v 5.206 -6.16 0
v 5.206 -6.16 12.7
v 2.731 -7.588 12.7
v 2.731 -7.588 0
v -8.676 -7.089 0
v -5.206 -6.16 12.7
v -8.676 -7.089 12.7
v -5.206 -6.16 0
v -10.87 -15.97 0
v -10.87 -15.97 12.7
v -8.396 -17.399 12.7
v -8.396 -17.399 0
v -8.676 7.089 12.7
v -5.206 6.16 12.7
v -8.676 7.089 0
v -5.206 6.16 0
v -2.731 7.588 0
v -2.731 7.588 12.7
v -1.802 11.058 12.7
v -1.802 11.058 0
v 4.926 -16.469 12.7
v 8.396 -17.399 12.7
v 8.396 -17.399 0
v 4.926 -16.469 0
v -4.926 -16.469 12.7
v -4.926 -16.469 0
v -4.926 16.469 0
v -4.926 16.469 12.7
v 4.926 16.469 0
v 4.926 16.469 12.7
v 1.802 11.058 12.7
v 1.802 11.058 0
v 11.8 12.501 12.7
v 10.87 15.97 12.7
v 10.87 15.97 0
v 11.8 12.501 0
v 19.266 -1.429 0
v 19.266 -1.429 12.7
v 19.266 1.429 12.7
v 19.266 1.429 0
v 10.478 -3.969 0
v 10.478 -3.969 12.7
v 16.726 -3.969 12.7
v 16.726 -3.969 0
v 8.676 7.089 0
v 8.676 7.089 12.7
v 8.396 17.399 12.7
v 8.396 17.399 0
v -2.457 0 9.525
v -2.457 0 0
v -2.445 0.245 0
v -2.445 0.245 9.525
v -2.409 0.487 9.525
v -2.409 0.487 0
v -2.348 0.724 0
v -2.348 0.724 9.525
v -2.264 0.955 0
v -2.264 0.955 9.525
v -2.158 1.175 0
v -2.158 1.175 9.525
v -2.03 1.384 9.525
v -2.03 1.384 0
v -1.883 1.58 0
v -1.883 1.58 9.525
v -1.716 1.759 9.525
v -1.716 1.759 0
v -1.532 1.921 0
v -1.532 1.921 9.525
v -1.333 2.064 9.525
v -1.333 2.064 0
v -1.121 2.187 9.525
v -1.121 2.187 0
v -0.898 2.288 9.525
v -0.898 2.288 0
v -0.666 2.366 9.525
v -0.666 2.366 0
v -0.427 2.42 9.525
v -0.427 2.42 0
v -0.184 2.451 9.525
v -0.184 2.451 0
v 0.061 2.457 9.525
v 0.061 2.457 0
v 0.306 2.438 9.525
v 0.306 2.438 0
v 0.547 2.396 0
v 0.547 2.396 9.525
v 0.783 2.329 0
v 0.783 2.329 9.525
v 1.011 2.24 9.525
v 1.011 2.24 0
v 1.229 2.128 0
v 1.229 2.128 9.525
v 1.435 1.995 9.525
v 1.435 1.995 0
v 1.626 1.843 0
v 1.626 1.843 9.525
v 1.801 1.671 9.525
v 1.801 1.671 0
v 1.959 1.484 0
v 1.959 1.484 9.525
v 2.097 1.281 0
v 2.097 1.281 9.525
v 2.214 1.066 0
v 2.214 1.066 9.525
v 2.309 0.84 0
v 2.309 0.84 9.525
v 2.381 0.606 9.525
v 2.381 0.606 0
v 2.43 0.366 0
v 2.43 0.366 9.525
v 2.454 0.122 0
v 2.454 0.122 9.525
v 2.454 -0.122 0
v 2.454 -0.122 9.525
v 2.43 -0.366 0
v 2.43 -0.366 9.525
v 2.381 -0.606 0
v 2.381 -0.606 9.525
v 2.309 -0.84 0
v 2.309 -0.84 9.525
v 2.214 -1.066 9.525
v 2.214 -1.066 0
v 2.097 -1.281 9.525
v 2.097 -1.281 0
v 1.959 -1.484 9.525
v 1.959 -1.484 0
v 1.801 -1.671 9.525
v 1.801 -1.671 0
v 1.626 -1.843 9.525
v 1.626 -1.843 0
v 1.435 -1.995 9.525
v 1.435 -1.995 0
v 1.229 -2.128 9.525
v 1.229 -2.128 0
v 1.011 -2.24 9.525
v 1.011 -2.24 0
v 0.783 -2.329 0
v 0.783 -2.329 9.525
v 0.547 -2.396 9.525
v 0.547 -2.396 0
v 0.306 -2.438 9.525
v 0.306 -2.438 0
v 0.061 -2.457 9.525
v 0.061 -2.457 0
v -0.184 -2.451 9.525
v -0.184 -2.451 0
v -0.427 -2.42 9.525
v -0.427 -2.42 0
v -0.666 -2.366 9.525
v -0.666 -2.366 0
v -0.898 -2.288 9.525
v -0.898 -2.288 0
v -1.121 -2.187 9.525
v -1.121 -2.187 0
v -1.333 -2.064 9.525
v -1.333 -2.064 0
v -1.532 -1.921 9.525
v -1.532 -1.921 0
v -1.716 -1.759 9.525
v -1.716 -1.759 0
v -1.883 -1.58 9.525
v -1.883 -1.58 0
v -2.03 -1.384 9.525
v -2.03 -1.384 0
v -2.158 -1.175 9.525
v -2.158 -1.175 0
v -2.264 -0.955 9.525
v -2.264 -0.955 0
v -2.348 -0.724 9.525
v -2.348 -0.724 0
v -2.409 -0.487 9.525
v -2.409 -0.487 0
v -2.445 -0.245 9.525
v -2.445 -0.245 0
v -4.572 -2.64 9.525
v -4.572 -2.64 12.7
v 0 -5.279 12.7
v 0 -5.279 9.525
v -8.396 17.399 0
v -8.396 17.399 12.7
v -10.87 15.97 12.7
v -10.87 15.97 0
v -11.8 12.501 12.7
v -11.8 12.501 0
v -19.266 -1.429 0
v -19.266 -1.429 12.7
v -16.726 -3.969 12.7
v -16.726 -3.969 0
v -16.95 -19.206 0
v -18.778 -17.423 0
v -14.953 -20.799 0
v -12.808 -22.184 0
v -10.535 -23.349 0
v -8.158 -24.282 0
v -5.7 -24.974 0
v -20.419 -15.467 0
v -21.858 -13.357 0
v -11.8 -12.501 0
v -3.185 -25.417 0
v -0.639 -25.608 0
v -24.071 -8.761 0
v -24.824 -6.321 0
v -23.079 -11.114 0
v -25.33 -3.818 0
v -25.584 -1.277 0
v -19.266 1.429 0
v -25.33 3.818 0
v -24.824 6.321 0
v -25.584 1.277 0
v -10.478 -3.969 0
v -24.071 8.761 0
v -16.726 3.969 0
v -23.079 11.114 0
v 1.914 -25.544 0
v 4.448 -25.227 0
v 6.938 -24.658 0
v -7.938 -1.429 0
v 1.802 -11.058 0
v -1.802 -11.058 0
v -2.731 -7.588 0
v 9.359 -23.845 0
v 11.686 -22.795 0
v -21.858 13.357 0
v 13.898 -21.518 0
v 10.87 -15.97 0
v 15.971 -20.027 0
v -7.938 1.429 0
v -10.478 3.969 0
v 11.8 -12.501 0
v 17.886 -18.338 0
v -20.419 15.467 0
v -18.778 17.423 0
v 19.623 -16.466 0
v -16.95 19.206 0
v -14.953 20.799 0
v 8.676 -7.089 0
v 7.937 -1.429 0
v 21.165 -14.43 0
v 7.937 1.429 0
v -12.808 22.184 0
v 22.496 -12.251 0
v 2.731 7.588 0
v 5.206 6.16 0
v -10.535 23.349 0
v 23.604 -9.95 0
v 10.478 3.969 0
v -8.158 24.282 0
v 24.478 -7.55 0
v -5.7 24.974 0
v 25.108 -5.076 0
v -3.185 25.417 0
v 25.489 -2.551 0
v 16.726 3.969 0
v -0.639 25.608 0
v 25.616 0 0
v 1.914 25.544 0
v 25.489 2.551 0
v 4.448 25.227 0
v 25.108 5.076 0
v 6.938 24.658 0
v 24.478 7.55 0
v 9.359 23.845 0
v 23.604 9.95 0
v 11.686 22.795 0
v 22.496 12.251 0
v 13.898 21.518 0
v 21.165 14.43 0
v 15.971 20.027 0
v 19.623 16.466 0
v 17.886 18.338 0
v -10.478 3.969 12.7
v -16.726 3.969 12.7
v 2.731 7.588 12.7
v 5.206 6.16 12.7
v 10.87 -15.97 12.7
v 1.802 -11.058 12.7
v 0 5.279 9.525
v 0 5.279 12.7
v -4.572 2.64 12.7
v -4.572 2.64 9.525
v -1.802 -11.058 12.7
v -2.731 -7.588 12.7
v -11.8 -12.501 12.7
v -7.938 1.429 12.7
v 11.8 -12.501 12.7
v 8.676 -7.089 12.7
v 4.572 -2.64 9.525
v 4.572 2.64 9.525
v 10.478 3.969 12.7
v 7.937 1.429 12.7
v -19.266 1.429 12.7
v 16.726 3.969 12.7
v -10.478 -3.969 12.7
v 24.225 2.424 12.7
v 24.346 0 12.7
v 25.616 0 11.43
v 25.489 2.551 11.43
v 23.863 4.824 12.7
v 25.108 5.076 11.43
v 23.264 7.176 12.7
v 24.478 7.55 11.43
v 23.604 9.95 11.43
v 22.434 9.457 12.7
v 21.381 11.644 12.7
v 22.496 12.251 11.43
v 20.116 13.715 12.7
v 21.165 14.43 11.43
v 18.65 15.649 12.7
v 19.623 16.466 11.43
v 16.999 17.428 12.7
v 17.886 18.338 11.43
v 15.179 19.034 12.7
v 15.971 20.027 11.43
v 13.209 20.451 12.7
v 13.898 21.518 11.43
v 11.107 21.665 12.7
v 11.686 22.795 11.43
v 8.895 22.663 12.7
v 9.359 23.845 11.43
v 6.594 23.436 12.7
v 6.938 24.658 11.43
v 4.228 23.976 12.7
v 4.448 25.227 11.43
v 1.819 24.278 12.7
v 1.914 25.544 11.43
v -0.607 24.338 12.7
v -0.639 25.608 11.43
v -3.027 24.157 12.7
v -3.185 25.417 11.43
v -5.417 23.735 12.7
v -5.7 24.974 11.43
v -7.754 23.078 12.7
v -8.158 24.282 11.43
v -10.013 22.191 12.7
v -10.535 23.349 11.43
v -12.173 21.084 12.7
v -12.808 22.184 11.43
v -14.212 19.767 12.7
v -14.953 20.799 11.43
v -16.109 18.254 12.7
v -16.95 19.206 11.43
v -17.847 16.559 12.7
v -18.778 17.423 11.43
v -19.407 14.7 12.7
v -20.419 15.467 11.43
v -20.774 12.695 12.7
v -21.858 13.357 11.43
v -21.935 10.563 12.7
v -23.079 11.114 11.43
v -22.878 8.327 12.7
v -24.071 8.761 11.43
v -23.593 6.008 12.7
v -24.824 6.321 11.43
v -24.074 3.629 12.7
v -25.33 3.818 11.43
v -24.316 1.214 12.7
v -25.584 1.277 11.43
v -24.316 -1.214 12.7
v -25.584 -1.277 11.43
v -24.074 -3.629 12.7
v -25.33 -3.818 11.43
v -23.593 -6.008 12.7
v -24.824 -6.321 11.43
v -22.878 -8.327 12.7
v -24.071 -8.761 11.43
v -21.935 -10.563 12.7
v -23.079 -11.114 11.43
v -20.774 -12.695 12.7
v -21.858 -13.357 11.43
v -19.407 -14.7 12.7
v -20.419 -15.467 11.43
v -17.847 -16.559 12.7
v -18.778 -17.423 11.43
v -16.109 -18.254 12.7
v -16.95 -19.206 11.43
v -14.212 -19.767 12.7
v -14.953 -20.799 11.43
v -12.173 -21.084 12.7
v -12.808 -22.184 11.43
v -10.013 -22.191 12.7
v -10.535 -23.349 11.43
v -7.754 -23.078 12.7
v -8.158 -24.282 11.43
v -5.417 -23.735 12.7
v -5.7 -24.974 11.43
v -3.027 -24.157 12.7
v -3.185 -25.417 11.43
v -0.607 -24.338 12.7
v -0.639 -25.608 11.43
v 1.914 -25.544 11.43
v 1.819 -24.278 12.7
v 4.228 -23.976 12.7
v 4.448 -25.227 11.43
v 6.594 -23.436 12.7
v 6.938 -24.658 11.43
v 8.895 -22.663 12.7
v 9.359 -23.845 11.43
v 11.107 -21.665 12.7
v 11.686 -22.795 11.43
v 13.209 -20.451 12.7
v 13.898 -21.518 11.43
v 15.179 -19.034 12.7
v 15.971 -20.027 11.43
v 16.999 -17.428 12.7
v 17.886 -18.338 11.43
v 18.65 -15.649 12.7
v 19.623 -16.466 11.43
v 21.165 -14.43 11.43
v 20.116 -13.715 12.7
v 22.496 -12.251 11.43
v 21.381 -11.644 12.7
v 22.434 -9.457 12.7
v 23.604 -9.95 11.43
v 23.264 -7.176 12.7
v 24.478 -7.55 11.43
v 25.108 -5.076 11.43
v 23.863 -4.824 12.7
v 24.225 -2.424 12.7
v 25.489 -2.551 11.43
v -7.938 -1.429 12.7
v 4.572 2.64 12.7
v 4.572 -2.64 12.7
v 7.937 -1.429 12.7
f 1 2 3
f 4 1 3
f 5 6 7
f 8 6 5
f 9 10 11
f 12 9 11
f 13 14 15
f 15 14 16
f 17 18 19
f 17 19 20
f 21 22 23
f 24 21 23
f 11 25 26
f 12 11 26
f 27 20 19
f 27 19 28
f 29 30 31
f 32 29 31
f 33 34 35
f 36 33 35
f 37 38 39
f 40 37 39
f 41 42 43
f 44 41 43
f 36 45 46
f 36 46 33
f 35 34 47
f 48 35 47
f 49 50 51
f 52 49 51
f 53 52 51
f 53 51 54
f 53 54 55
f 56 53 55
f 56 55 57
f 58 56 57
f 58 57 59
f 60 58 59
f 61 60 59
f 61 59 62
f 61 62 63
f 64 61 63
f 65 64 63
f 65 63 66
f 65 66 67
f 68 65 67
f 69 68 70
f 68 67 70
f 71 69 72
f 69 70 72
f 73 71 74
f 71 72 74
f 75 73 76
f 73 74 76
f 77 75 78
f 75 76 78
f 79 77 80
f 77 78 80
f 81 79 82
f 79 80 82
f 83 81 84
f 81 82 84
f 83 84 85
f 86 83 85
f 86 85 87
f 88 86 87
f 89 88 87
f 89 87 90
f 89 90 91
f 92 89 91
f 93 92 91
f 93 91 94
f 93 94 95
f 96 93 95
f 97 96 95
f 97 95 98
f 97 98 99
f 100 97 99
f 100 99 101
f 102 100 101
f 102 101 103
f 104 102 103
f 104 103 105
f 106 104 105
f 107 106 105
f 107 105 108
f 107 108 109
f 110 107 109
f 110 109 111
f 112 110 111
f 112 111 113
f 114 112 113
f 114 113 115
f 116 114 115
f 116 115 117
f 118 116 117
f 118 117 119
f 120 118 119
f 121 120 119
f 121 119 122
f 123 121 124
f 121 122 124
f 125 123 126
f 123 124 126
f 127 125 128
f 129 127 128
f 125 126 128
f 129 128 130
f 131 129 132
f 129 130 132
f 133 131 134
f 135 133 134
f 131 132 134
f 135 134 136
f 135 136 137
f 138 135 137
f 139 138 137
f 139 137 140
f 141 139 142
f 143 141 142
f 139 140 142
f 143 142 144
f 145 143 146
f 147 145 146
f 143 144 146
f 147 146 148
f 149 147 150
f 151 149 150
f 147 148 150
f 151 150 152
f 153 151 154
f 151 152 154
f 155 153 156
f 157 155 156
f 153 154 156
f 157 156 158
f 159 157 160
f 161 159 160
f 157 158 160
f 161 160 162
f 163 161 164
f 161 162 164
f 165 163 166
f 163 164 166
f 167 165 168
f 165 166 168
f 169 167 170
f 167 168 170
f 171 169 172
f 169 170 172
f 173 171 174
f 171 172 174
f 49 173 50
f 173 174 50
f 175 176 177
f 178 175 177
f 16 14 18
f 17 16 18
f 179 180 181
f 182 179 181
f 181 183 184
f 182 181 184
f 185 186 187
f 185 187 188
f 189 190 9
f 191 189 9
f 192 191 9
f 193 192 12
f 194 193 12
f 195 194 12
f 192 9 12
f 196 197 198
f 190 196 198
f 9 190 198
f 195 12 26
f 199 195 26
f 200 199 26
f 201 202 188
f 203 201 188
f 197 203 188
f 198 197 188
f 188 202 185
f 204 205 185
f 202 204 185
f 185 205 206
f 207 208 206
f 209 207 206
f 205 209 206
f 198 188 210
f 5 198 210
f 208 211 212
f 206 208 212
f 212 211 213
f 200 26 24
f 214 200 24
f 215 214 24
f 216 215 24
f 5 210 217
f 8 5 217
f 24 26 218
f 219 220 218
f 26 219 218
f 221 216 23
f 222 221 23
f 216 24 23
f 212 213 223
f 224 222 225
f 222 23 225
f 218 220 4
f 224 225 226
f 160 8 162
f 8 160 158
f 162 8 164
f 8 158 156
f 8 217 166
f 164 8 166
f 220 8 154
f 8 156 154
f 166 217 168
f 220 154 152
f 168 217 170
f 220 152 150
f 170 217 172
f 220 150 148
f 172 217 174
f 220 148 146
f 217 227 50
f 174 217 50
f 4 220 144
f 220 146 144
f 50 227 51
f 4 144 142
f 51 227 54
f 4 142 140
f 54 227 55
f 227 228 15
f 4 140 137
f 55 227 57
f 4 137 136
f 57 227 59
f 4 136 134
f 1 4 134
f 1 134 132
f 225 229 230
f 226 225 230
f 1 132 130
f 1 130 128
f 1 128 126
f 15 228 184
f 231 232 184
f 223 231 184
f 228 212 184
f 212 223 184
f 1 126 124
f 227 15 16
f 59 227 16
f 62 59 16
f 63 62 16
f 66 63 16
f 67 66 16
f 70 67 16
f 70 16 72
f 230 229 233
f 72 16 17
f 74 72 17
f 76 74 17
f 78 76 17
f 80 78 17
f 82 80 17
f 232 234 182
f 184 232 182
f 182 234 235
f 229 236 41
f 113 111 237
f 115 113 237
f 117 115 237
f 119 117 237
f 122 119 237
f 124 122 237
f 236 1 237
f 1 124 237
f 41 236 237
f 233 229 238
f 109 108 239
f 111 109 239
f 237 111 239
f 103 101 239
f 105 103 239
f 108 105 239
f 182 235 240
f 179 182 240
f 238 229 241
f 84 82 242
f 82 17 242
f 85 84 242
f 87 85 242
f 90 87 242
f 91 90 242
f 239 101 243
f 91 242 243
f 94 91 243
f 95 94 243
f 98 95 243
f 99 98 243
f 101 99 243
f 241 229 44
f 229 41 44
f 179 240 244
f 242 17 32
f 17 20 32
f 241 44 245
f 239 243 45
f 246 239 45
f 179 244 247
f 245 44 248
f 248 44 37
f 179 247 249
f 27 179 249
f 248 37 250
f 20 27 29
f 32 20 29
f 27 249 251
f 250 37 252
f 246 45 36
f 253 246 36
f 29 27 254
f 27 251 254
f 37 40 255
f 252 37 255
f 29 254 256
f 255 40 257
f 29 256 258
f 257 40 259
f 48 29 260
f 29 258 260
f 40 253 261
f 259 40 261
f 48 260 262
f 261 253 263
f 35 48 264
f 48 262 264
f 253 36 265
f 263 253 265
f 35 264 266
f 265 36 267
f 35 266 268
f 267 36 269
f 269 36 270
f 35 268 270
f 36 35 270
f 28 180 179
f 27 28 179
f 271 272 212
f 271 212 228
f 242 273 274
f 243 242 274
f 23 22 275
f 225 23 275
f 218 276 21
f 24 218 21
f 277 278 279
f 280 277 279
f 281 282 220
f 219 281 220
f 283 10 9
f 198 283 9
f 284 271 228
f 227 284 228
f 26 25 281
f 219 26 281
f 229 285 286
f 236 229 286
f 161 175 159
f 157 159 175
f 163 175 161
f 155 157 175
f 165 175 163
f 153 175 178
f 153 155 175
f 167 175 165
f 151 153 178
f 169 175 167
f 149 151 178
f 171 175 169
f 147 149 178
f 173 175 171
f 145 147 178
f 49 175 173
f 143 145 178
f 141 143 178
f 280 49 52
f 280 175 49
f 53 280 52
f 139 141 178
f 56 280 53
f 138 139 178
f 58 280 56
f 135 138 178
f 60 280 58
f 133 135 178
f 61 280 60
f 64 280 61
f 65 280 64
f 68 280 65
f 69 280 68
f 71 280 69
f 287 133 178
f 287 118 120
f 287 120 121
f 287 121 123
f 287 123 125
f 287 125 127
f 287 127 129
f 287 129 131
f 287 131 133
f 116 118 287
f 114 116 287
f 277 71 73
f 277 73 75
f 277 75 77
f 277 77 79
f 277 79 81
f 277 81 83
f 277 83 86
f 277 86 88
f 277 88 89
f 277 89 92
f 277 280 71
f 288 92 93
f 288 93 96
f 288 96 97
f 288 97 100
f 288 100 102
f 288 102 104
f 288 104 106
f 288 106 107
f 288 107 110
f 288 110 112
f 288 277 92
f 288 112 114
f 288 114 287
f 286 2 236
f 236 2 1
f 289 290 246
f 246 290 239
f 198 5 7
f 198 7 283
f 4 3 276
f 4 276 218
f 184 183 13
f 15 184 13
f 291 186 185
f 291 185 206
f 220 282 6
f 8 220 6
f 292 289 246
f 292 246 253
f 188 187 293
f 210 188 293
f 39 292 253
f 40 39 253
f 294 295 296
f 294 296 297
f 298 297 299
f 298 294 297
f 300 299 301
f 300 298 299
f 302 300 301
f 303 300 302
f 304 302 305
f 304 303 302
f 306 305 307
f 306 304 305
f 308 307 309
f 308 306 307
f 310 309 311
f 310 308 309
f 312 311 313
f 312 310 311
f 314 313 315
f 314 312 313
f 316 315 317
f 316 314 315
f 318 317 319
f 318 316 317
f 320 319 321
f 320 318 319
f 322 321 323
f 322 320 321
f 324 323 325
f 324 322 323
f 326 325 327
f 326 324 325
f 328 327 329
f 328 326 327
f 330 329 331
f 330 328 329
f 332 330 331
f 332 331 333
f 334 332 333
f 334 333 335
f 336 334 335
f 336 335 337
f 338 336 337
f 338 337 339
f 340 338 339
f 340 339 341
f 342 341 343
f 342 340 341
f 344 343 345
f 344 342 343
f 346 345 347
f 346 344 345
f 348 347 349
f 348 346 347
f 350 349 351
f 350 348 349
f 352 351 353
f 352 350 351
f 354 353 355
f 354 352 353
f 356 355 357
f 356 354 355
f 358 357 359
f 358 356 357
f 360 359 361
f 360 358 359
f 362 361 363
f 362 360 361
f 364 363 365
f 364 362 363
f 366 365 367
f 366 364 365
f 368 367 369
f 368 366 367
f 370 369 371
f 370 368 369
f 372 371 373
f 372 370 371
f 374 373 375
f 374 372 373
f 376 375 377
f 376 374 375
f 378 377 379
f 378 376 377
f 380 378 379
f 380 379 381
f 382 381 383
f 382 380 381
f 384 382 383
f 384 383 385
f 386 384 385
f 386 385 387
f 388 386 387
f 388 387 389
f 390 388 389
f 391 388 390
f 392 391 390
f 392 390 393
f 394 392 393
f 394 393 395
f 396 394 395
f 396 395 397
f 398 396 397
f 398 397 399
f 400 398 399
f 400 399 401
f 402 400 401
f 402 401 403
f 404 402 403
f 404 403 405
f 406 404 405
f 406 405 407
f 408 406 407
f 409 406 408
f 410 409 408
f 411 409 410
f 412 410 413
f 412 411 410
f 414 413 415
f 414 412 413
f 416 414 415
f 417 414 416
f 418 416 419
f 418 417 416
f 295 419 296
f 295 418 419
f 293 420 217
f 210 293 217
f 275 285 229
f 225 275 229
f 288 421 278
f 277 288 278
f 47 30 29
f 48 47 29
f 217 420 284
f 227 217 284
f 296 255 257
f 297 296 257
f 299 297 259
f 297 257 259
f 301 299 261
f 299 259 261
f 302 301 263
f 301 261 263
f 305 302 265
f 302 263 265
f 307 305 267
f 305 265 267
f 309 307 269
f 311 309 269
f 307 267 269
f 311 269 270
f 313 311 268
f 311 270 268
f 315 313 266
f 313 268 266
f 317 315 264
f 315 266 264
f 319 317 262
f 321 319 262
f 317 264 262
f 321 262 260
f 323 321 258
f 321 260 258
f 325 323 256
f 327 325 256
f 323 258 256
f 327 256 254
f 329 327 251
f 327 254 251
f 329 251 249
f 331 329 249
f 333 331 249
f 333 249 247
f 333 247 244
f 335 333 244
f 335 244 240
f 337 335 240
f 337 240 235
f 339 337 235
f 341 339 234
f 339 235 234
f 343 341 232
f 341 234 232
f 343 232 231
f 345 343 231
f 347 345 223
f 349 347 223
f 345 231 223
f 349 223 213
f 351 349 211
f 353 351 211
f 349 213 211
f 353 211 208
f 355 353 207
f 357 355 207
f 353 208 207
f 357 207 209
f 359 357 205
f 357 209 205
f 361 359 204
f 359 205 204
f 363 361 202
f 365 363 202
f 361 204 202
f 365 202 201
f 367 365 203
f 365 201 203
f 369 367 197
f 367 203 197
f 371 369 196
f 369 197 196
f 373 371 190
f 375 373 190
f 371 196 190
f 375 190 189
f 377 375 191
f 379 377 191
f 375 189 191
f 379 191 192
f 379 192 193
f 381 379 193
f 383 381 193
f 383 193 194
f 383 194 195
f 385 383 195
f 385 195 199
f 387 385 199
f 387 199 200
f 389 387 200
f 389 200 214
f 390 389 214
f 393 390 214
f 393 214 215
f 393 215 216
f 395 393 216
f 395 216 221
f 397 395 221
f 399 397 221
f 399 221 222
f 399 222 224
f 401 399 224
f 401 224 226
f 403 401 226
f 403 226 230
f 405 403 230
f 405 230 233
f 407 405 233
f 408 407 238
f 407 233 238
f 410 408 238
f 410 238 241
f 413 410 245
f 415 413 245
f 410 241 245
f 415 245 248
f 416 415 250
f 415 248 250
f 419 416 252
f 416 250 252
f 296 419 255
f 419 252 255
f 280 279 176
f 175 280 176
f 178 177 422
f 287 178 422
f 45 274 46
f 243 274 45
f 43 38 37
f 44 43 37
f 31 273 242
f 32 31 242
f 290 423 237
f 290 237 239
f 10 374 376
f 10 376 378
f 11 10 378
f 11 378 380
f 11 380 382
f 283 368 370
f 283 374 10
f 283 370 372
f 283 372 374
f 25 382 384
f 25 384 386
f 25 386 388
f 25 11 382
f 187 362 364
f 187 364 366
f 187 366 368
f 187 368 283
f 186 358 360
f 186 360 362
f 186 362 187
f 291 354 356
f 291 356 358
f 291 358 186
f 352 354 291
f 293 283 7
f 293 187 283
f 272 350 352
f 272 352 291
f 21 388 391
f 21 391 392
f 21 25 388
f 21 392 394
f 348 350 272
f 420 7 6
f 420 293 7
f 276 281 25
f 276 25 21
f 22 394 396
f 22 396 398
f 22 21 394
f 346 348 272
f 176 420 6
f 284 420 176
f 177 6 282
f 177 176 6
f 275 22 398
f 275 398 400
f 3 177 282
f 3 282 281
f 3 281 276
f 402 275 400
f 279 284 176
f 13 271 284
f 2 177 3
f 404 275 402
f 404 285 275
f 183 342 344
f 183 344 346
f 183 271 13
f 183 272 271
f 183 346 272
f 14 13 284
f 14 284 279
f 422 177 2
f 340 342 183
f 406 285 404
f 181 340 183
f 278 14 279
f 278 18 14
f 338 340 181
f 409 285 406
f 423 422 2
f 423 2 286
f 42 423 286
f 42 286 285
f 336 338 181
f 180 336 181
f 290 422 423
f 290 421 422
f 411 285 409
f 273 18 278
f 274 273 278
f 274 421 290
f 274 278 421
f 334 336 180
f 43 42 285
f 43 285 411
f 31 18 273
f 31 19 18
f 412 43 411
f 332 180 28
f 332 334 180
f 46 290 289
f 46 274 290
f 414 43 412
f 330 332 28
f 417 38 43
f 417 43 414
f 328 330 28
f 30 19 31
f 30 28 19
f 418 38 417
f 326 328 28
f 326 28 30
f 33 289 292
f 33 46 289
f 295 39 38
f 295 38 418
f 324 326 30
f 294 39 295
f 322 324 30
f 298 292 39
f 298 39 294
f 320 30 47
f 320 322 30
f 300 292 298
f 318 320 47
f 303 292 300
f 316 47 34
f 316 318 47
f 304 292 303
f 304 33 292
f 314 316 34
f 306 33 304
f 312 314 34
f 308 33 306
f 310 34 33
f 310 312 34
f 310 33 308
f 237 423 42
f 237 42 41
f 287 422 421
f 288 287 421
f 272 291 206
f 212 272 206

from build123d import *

# Parameters (mm, degrees)
SKETCH1_R               = 25.6159
BOSS_EXTRUDE1_DEPTH     = 12.7
CHAMFER1_SIZE           = 1.27
CUT_EXTRUDE1_DEPTH      = 3.175
F_8_CLEARANCE_HOLE1_D   = 4.9149
SKETCH5_W               = 11.3284
SKETCH5_H               = 7.9375
CUT_EXTRUDE_THIN1_DEPTH = 13.7
CHAMFER2_SIZE           = 2.54


with BuildPart() as part:
    # Sketch1 → Boss-Extrude1 (new body)
    with BuildSketch(Plane.XY):
        Circle(SKETCH1_R)
    extrude(amount=BOSS_EXTRUDE1_DEPTH)

    # Chamfer1
    chamfer1_edges = [part.edges().sort_by_distance(p)[0] for p in [
        (-25.6159, 0, 12.7),
    ]]
    chamfer(chamfer1_edges, length=CHAMFER1_SIZE)

    # Sketch2 → Cut-Extrude1 (cut)
    with BuildSketch(Plane.XY.offset(12.7)):
        Polygon((-4.572, -2.639645431), (0, -5.279290861), (4.572, -2.639645431), (4.572, 2.639645431), (0, 5.279290861), (-4.572, 2.639645431), align=None)
    extrude(amount=-CUT_EXTRUDE1_DEPTH, mode=Mode.SUBTRACT)

    # #8 Clearance Hole1 (through all)
    with Locations(Plane.XY.offset(12.7)):
        with Locations((0, 0)):
            Hole(F_8_CLEARANCE_HOLE1_D / 2)

    # Sketch5 → Cut-Extrude-Thin1 (cut, through all)
    with BuildSketch(Plane.XY.offset(12.7)):
        Polygon((-7.405788321, -4.889701643), (-13.069988321, -14.700383827), (-6.195911679, -18.669133827), (-0.531711679, -8.858451643), align=None)
        with Locations((-13.6017, 0)):
            Rectangle(SKETCH5_W, SKETCH5_H)
        Polygon((-0.531711679, 8.858451643), (-6.195911679, 18.669133827), (-13.069988321, 14.700383827), (-7.405788321, 4.889701643), align=None)
        Polygon((7.405788321, 4.889701643), (13.069988321, 14.700383827), (6.195911679, 18.669133827), (0.531711679, 8.858451643), align=None)
        with Locations((13.6017, 0)):
            Rectangle(SKETCH5_W, SKETCH5_H)
        Polygon((0.531711679, -8.858451643), (6.195911679, -18.669133827), (13.069988321, -14.700383827), (7.405788321, -4.889701643), align=None)
    extrude(amount=-CUT_EXTRUDE_THIN1_DEPTH, mode=Mode.SUBTRACT)

    # Chamfer2
    chamfer2_edges = [part.edges().sort_by_distance(p)[0] for p in [
        (6.195911679, -18.669133827, 6.35),
        (0.531711679, -8.858451643, 6.35),
        (7.405788321, -4.889701643, 6.35),
        (13.069988321, -14.700383827, 6.35),
        (19.2659, -3.96875, 6.35),
        (7.9375, -3.96875, 6.35),
        (7.9375, 3.96875, 6.35),
        (19.2659, 3.96875, 6.35),
        (13.069988321, 14.700383827, 6.35),
        (7.405788321, 4.889701643, 6.35),
        (0.531711679, 8.858451643, 6.35),
        (6.195911679, 18.669133827, 6.35),
        (-6.195911679, 18.669133827, 6.35),
        (-0.531711679, 8.858451643, 6.35),
        (-7.405788321, 4.889701643, 6.35),
        (-13.069988321, 14.700383827, 6.35),
        (-19.2659, 3.96875, 6.35),
        (-7.9375, 3.96875, 6.35),
        (-7.9375, -3.96875, 6.35),
        (-19.2659, -3.96875, 6.35),
        (-13.069988321, -14.700383827, 6.35),
        (-7.405788321, -4.889701643, 6.35),
        (-0.531711679, -8.858451643, 6.35),
        (-6.195911679, -18.669133827, 6.35),
    ]]
    chamfer(chamfer2_edges, length=CHAMFER2_SIZE)


solid = part.part
